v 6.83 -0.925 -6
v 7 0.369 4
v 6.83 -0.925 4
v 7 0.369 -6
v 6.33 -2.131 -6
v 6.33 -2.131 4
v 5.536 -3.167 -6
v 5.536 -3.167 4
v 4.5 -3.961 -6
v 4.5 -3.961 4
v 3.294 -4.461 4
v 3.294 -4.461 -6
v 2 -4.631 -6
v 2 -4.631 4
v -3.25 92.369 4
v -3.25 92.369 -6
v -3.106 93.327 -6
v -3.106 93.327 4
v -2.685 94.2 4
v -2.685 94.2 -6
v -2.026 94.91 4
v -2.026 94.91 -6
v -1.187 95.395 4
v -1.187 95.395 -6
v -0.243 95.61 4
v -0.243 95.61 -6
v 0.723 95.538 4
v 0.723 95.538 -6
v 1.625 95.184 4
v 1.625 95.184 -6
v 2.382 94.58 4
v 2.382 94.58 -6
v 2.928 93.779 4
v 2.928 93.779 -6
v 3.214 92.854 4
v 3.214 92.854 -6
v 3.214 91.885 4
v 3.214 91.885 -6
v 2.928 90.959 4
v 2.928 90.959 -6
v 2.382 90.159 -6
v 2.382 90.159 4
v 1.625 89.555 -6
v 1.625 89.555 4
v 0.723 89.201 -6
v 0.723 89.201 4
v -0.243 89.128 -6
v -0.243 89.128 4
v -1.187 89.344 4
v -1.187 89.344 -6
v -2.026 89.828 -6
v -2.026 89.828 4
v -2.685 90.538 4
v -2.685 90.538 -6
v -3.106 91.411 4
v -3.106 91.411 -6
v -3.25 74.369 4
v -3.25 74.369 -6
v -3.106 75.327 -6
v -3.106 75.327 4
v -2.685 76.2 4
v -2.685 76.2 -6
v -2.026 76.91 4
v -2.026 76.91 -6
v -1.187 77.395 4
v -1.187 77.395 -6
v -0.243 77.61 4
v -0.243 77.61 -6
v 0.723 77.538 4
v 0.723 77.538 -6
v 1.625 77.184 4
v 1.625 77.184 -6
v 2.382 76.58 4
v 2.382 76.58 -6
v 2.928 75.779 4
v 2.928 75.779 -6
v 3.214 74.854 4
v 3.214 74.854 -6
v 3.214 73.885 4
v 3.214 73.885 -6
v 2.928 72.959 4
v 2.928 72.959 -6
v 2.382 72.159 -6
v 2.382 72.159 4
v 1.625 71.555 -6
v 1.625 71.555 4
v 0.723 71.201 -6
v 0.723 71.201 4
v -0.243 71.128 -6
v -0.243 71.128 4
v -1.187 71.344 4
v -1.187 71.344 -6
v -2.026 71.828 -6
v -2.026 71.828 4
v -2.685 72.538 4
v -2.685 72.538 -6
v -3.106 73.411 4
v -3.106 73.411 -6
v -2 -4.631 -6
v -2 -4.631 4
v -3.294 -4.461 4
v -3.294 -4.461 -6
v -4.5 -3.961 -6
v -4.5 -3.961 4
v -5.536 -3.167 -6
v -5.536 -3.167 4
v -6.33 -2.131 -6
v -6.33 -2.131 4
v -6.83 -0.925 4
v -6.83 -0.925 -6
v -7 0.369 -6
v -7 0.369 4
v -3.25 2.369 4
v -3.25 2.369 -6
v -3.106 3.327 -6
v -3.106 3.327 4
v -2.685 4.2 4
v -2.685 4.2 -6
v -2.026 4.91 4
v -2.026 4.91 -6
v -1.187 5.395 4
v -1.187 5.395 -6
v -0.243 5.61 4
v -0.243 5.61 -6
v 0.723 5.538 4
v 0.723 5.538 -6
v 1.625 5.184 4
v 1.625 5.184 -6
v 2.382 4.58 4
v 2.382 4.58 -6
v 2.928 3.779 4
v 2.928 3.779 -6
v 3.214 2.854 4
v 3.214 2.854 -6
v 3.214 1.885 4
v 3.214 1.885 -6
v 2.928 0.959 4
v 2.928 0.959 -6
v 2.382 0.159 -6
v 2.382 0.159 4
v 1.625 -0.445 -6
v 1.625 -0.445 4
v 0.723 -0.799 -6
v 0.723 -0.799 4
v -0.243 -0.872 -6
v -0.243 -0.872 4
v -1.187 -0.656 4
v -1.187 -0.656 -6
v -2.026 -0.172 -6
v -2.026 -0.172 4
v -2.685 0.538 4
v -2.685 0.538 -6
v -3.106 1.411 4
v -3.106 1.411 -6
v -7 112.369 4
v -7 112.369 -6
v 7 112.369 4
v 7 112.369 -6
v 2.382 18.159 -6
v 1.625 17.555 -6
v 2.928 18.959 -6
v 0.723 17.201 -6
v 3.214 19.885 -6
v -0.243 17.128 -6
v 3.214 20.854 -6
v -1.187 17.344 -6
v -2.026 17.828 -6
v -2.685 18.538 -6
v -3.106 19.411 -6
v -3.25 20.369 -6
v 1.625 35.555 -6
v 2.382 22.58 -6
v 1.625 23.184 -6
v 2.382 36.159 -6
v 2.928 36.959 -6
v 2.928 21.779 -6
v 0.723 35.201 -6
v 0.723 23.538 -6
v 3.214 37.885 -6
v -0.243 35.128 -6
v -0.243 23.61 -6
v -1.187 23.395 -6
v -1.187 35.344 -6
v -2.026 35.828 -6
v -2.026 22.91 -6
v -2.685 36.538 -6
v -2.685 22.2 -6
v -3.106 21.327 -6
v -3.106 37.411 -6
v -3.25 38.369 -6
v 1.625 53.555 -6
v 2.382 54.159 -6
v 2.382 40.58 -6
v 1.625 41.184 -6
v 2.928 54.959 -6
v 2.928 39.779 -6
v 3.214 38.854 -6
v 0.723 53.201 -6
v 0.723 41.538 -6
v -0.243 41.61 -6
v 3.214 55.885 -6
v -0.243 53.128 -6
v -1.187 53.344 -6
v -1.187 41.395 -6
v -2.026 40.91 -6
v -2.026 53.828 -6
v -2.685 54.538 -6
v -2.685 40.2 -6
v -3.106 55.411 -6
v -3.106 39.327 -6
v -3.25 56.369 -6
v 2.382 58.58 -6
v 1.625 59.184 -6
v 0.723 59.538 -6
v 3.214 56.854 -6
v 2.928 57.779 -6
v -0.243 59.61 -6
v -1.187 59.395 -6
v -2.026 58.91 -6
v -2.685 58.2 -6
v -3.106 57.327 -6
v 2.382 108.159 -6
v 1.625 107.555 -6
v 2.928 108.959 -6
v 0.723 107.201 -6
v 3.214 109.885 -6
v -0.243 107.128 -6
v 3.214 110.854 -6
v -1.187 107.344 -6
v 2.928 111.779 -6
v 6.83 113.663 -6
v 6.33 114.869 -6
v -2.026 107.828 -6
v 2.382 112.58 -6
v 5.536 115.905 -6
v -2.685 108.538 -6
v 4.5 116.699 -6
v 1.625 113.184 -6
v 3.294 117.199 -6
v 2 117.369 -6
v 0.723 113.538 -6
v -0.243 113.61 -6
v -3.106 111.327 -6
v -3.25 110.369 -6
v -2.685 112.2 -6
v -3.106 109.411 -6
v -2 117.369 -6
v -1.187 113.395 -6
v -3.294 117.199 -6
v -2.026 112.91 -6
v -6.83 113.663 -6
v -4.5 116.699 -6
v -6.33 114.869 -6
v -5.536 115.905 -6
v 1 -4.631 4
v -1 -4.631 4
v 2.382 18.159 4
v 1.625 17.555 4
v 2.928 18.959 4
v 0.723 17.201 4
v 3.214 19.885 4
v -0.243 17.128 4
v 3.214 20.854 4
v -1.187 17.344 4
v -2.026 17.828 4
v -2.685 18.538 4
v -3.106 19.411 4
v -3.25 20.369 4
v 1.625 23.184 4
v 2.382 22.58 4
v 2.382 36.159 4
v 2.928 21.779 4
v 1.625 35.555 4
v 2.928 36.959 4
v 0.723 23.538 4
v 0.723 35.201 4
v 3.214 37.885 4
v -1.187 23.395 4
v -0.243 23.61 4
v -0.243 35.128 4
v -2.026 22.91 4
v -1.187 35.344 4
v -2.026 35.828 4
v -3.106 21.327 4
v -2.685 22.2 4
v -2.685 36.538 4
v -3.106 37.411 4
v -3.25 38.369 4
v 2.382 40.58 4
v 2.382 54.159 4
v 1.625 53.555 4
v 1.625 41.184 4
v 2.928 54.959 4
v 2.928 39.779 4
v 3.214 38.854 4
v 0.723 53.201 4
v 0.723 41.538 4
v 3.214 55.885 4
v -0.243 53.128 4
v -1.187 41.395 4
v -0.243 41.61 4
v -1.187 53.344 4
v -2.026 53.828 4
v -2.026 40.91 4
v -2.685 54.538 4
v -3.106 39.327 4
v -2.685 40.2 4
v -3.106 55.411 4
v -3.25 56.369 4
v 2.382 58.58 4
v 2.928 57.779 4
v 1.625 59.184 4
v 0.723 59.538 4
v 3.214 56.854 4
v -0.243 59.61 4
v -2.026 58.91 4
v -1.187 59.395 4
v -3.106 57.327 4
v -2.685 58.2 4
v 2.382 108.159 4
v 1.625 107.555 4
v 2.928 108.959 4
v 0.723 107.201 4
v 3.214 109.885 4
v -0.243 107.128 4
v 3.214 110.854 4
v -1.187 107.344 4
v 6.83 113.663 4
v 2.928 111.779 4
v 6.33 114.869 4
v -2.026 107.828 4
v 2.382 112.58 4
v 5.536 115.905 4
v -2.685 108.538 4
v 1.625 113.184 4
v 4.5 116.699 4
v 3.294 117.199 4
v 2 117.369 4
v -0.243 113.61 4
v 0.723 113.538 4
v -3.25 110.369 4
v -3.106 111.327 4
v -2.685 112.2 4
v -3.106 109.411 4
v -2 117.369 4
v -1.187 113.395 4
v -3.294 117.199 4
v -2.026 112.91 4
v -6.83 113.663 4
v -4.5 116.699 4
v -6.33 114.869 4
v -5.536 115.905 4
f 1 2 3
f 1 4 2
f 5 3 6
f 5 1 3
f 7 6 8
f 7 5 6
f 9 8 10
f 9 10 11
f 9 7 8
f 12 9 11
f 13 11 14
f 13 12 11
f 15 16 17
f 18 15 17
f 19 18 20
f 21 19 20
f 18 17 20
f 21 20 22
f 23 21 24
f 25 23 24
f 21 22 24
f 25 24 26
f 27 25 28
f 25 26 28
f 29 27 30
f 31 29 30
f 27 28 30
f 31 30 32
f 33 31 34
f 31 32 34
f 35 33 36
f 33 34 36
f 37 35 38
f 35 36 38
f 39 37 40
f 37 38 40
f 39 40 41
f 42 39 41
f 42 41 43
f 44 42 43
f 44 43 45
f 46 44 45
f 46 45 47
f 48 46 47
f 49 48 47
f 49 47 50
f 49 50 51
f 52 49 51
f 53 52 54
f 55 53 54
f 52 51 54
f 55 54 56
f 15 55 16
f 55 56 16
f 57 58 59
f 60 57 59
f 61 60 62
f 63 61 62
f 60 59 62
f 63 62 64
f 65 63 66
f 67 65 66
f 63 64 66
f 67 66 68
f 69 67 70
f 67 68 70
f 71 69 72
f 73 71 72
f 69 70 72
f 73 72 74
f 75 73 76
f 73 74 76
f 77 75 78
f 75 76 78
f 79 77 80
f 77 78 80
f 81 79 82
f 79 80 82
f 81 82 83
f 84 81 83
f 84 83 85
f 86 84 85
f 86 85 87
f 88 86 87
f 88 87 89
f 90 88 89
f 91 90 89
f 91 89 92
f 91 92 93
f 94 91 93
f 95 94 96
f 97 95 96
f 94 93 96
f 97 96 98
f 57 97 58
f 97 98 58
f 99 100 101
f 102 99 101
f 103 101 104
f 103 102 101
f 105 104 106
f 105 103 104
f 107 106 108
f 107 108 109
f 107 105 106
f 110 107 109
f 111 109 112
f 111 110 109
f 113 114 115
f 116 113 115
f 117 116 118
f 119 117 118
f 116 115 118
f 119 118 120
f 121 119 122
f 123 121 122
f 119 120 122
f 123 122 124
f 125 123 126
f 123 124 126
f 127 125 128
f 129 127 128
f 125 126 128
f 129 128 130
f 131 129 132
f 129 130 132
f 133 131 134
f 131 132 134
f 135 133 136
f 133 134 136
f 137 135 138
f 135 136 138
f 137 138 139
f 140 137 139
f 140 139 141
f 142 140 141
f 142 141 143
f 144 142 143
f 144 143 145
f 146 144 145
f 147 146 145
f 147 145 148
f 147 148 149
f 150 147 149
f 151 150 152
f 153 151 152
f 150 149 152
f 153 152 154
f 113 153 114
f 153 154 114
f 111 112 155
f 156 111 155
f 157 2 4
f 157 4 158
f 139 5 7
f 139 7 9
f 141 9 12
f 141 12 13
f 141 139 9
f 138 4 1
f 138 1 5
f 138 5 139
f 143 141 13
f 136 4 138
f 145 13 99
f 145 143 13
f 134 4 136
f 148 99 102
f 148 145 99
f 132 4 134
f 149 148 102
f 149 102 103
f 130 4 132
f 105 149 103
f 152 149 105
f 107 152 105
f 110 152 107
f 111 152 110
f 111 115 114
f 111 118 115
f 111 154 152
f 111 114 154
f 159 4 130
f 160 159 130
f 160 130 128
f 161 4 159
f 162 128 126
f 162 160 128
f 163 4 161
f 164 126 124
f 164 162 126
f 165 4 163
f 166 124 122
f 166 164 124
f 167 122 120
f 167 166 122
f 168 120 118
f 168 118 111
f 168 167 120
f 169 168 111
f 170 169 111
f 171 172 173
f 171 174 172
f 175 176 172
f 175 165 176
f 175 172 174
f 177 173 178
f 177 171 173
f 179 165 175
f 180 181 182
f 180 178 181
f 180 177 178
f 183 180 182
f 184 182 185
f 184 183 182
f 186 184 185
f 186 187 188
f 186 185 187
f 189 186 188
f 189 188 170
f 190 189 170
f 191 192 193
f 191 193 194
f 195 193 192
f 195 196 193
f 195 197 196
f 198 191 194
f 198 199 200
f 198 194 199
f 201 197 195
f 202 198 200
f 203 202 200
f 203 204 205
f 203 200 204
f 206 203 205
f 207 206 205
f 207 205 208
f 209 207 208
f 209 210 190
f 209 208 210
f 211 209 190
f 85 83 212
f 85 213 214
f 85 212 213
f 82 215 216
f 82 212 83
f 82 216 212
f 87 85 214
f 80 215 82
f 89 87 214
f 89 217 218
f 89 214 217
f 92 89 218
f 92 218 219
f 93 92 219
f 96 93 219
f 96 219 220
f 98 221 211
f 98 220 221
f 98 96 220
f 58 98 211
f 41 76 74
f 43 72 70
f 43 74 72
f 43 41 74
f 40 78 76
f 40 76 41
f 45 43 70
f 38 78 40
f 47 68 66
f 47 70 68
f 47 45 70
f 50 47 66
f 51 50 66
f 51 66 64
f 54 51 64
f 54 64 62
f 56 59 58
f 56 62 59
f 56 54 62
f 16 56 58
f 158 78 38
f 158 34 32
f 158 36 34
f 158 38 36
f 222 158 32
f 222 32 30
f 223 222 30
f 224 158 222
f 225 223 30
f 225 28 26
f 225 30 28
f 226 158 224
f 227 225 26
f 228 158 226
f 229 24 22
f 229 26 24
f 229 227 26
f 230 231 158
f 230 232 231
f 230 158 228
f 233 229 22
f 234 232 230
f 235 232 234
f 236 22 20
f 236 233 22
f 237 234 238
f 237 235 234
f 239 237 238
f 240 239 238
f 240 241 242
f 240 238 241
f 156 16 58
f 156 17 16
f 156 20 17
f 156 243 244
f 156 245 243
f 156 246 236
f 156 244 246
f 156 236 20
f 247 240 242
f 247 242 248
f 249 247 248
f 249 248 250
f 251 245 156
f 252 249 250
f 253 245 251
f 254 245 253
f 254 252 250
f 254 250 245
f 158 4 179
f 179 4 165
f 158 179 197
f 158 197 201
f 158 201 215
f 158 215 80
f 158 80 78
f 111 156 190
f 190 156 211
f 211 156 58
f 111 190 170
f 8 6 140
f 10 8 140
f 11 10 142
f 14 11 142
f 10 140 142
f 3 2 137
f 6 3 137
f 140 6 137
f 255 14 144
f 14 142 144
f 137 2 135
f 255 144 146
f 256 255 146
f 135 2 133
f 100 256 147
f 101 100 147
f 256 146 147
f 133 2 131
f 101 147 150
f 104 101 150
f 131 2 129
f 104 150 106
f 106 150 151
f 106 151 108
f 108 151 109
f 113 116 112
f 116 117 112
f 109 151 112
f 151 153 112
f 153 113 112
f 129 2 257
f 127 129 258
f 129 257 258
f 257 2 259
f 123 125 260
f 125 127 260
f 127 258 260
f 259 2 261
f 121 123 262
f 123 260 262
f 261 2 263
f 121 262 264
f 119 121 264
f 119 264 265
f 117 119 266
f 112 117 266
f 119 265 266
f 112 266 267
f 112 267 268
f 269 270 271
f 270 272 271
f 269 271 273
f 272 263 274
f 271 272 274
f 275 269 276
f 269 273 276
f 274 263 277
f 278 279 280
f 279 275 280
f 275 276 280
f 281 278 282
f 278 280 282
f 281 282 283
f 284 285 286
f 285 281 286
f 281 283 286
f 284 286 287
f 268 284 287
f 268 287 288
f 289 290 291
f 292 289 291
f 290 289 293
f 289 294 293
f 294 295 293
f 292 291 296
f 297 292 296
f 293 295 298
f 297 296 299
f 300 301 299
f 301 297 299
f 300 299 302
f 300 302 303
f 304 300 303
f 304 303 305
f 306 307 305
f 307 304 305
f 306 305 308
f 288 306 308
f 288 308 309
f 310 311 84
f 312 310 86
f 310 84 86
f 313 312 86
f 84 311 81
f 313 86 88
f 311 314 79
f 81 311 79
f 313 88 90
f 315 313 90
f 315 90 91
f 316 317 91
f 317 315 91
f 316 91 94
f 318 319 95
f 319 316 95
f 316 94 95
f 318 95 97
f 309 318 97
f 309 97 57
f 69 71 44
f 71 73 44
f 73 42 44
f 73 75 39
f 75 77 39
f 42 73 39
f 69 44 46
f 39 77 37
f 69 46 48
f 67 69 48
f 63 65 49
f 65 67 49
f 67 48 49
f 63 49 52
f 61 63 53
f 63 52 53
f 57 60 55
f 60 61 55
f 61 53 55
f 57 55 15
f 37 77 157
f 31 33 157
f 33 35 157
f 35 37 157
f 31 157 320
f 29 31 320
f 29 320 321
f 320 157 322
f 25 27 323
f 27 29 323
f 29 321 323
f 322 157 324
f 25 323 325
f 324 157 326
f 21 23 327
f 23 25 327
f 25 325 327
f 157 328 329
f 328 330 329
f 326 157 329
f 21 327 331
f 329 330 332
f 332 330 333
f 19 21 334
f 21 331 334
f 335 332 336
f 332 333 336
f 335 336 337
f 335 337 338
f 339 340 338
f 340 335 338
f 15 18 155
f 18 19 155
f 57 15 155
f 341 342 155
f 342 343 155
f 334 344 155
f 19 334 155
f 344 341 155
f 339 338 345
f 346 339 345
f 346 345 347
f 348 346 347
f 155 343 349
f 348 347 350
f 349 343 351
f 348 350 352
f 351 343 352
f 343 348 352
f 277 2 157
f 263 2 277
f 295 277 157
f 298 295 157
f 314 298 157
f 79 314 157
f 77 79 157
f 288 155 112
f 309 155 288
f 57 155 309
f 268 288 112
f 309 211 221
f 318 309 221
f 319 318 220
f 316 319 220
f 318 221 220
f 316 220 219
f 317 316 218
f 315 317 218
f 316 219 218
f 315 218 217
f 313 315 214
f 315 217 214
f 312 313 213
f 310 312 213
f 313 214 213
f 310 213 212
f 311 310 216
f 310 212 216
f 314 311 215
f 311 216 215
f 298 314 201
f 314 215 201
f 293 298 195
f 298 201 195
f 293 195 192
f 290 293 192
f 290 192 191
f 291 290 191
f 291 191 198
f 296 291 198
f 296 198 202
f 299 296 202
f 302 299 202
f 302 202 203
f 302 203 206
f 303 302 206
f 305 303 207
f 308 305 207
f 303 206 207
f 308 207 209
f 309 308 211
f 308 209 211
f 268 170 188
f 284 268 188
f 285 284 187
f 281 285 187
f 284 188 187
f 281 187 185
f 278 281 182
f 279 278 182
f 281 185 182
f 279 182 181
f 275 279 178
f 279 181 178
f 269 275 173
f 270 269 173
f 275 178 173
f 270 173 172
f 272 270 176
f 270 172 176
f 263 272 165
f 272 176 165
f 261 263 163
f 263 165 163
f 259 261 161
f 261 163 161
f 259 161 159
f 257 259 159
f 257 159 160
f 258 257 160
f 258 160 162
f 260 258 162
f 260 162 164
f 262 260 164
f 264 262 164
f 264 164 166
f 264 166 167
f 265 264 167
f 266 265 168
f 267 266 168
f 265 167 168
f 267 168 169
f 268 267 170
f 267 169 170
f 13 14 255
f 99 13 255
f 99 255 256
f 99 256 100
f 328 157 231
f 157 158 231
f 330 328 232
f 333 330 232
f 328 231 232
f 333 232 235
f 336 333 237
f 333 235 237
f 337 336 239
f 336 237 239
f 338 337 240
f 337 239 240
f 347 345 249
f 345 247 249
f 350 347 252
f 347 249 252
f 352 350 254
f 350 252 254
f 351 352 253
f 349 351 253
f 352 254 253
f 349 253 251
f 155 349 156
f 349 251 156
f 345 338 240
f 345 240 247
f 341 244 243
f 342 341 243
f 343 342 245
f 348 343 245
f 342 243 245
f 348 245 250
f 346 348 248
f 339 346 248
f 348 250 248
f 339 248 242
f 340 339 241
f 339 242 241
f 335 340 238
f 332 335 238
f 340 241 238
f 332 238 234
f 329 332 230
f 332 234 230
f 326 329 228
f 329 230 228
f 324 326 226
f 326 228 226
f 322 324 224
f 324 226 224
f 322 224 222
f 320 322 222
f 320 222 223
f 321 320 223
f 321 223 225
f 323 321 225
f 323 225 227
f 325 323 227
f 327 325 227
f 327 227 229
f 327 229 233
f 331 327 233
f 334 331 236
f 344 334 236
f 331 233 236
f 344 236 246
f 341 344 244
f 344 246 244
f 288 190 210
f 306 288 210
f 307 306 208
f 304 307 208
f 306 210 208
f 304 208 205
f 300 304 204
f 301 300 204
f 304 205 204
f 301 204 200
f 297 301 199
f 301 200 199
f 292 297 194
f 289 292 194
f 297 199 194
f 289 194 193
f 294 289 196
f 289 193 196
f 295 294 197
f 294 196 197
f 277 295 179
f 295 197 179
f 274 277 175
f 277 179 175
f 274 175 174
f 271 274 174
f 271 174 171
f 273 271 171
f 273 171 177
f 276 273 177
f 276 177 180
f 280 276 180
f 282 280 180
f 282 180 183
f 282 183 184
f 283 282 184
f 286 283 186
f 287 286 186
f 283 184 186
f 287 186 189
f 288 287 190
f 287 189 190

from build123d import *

# Parameters (mm, degrees)
SKETCH1_W                = 12
SKETCH1_H                = 109.262
BOSS_EXTRUDE1_DEPTH      = 4
FILLET1_R                = 5
CUT_EXTRUDE1_DEPTH       = 10.5
SKETCH4_W                = 12
SKETCH4_H                = 6.738165359
BOSS_EXTRUDE2_DEPTH      = 4
BOSS_EXTRUDE3_DEPTH      = 6
BOSS_EXTRUDE3_DEPTH_BACK = 4
SKETCH5_W                = 14
SKETCH5_H                = 122.000165359
SKETCH6_R                = 3.25
CUT_EXTRUDE3_DEPTH       = 10
FILLET2_R                = 5
LPATTERN1_COUNT          = 7
LPATTERN1_PITCH          = 18


with BuildPart() as part:
    # Sketch1 → Boss-Extrude1 (new body)
    with BuildSketch(Plane.XY):
        with Locations((0, 50)):
            Rectangle(SKETCH1_W, SKETCH1_H)
    extrude(amount=BOSS_EXTRUDE1_DEPTH)

    # Fillet1
    fillet1_edges = [part.edges().sort_by_distance(p)[0] for p in [
        (-6, -4.631, 2),
        (6, -4.631, 2),
    ]]
    fillet(fillet1_edges, radius=FILLET1_R)

    # Sketch2 → Cut-Extrude1 (cut)
    with BuildSketch(Plane.XY.offset(4)):
        with BuildLine():
            Line((2, 98.631), (2, 1.369))
            ThreePointArc((2, 1.369), (0, -0.631), (-2, 1.369))
            Line((-2, 1.369), (-2, 98.631))
            ThreePointArc((-2, 98.631), (0, 100.631), (2, 98.631))
        make_face()
    extrude(amount=-CUT_EXTRUDE1_DEPTH, mode=Mode.SUBTRACT)

    # Sketch4 → Boss-Extrude2 (add)
    with BuildSketch(Plane.XY.offset(4)):
        with Locations((0, 108.000082679)):
            Rectangle(SKETCH4_W, SKETCH4_H)
    extrude(amount=-BOSS_EXTRUDE2_DEPTH)

    # Sketch5 → Boss-Extrude3 (add, two sides: drawn at the far end of the back side and taken through both)
    with BuildSketch(Plane(origin=(0, 0, 0), x_dir=(-1, 0, 0), z_dir=(0, 0, -1)).offset(-BOSS_EXTRUDE3_DEPTH_BACK)):
        with Locations((0, 56.36908268)):
            Rectangle(SKETCH5_W, SKETCH5_H)
    extrude(amount=BOSS_EXTRUDE3_DEPTH + BOSS_EXTRUDE3_DEPTH_BACK)

    # Sketch6 → Cut-Extrude3 (cut)
    with BuildSketch(Plane(origin=(0, 0, -6), x_dir=(-1, 0, 0), z_dir=(0, 0, -1))):
        with Locations((0, 110.369165359)):
            Circle(SKETCH6_R)
    cut_extrude3 = extrude(amount=-CUT_EXTRUDE3_DEPTH, mode=Mode.SUBTRACT)

    # Fillet2
    fillet2_edges = [part.edges().sort_by_distance(p)[0] for p in [
        (-7, -4.631, -1),
        (-7, 117.369165359, -1),
        (7, 117.369165359, -1),
        (7, -4.631, -1),
    ]]
    fillet(fillet2_edges, radius=FILLET2_R)

    # LPattern1: Cut-Extrude3 ×7
    with Locations(*[(0, -i * LPATTERN1_PITCH, 0) for i in range(1, LPATTERN1_COUNT)]):
        add(cut_extrude3, mode=Mode.SUBTRACT)


solid = part.part
